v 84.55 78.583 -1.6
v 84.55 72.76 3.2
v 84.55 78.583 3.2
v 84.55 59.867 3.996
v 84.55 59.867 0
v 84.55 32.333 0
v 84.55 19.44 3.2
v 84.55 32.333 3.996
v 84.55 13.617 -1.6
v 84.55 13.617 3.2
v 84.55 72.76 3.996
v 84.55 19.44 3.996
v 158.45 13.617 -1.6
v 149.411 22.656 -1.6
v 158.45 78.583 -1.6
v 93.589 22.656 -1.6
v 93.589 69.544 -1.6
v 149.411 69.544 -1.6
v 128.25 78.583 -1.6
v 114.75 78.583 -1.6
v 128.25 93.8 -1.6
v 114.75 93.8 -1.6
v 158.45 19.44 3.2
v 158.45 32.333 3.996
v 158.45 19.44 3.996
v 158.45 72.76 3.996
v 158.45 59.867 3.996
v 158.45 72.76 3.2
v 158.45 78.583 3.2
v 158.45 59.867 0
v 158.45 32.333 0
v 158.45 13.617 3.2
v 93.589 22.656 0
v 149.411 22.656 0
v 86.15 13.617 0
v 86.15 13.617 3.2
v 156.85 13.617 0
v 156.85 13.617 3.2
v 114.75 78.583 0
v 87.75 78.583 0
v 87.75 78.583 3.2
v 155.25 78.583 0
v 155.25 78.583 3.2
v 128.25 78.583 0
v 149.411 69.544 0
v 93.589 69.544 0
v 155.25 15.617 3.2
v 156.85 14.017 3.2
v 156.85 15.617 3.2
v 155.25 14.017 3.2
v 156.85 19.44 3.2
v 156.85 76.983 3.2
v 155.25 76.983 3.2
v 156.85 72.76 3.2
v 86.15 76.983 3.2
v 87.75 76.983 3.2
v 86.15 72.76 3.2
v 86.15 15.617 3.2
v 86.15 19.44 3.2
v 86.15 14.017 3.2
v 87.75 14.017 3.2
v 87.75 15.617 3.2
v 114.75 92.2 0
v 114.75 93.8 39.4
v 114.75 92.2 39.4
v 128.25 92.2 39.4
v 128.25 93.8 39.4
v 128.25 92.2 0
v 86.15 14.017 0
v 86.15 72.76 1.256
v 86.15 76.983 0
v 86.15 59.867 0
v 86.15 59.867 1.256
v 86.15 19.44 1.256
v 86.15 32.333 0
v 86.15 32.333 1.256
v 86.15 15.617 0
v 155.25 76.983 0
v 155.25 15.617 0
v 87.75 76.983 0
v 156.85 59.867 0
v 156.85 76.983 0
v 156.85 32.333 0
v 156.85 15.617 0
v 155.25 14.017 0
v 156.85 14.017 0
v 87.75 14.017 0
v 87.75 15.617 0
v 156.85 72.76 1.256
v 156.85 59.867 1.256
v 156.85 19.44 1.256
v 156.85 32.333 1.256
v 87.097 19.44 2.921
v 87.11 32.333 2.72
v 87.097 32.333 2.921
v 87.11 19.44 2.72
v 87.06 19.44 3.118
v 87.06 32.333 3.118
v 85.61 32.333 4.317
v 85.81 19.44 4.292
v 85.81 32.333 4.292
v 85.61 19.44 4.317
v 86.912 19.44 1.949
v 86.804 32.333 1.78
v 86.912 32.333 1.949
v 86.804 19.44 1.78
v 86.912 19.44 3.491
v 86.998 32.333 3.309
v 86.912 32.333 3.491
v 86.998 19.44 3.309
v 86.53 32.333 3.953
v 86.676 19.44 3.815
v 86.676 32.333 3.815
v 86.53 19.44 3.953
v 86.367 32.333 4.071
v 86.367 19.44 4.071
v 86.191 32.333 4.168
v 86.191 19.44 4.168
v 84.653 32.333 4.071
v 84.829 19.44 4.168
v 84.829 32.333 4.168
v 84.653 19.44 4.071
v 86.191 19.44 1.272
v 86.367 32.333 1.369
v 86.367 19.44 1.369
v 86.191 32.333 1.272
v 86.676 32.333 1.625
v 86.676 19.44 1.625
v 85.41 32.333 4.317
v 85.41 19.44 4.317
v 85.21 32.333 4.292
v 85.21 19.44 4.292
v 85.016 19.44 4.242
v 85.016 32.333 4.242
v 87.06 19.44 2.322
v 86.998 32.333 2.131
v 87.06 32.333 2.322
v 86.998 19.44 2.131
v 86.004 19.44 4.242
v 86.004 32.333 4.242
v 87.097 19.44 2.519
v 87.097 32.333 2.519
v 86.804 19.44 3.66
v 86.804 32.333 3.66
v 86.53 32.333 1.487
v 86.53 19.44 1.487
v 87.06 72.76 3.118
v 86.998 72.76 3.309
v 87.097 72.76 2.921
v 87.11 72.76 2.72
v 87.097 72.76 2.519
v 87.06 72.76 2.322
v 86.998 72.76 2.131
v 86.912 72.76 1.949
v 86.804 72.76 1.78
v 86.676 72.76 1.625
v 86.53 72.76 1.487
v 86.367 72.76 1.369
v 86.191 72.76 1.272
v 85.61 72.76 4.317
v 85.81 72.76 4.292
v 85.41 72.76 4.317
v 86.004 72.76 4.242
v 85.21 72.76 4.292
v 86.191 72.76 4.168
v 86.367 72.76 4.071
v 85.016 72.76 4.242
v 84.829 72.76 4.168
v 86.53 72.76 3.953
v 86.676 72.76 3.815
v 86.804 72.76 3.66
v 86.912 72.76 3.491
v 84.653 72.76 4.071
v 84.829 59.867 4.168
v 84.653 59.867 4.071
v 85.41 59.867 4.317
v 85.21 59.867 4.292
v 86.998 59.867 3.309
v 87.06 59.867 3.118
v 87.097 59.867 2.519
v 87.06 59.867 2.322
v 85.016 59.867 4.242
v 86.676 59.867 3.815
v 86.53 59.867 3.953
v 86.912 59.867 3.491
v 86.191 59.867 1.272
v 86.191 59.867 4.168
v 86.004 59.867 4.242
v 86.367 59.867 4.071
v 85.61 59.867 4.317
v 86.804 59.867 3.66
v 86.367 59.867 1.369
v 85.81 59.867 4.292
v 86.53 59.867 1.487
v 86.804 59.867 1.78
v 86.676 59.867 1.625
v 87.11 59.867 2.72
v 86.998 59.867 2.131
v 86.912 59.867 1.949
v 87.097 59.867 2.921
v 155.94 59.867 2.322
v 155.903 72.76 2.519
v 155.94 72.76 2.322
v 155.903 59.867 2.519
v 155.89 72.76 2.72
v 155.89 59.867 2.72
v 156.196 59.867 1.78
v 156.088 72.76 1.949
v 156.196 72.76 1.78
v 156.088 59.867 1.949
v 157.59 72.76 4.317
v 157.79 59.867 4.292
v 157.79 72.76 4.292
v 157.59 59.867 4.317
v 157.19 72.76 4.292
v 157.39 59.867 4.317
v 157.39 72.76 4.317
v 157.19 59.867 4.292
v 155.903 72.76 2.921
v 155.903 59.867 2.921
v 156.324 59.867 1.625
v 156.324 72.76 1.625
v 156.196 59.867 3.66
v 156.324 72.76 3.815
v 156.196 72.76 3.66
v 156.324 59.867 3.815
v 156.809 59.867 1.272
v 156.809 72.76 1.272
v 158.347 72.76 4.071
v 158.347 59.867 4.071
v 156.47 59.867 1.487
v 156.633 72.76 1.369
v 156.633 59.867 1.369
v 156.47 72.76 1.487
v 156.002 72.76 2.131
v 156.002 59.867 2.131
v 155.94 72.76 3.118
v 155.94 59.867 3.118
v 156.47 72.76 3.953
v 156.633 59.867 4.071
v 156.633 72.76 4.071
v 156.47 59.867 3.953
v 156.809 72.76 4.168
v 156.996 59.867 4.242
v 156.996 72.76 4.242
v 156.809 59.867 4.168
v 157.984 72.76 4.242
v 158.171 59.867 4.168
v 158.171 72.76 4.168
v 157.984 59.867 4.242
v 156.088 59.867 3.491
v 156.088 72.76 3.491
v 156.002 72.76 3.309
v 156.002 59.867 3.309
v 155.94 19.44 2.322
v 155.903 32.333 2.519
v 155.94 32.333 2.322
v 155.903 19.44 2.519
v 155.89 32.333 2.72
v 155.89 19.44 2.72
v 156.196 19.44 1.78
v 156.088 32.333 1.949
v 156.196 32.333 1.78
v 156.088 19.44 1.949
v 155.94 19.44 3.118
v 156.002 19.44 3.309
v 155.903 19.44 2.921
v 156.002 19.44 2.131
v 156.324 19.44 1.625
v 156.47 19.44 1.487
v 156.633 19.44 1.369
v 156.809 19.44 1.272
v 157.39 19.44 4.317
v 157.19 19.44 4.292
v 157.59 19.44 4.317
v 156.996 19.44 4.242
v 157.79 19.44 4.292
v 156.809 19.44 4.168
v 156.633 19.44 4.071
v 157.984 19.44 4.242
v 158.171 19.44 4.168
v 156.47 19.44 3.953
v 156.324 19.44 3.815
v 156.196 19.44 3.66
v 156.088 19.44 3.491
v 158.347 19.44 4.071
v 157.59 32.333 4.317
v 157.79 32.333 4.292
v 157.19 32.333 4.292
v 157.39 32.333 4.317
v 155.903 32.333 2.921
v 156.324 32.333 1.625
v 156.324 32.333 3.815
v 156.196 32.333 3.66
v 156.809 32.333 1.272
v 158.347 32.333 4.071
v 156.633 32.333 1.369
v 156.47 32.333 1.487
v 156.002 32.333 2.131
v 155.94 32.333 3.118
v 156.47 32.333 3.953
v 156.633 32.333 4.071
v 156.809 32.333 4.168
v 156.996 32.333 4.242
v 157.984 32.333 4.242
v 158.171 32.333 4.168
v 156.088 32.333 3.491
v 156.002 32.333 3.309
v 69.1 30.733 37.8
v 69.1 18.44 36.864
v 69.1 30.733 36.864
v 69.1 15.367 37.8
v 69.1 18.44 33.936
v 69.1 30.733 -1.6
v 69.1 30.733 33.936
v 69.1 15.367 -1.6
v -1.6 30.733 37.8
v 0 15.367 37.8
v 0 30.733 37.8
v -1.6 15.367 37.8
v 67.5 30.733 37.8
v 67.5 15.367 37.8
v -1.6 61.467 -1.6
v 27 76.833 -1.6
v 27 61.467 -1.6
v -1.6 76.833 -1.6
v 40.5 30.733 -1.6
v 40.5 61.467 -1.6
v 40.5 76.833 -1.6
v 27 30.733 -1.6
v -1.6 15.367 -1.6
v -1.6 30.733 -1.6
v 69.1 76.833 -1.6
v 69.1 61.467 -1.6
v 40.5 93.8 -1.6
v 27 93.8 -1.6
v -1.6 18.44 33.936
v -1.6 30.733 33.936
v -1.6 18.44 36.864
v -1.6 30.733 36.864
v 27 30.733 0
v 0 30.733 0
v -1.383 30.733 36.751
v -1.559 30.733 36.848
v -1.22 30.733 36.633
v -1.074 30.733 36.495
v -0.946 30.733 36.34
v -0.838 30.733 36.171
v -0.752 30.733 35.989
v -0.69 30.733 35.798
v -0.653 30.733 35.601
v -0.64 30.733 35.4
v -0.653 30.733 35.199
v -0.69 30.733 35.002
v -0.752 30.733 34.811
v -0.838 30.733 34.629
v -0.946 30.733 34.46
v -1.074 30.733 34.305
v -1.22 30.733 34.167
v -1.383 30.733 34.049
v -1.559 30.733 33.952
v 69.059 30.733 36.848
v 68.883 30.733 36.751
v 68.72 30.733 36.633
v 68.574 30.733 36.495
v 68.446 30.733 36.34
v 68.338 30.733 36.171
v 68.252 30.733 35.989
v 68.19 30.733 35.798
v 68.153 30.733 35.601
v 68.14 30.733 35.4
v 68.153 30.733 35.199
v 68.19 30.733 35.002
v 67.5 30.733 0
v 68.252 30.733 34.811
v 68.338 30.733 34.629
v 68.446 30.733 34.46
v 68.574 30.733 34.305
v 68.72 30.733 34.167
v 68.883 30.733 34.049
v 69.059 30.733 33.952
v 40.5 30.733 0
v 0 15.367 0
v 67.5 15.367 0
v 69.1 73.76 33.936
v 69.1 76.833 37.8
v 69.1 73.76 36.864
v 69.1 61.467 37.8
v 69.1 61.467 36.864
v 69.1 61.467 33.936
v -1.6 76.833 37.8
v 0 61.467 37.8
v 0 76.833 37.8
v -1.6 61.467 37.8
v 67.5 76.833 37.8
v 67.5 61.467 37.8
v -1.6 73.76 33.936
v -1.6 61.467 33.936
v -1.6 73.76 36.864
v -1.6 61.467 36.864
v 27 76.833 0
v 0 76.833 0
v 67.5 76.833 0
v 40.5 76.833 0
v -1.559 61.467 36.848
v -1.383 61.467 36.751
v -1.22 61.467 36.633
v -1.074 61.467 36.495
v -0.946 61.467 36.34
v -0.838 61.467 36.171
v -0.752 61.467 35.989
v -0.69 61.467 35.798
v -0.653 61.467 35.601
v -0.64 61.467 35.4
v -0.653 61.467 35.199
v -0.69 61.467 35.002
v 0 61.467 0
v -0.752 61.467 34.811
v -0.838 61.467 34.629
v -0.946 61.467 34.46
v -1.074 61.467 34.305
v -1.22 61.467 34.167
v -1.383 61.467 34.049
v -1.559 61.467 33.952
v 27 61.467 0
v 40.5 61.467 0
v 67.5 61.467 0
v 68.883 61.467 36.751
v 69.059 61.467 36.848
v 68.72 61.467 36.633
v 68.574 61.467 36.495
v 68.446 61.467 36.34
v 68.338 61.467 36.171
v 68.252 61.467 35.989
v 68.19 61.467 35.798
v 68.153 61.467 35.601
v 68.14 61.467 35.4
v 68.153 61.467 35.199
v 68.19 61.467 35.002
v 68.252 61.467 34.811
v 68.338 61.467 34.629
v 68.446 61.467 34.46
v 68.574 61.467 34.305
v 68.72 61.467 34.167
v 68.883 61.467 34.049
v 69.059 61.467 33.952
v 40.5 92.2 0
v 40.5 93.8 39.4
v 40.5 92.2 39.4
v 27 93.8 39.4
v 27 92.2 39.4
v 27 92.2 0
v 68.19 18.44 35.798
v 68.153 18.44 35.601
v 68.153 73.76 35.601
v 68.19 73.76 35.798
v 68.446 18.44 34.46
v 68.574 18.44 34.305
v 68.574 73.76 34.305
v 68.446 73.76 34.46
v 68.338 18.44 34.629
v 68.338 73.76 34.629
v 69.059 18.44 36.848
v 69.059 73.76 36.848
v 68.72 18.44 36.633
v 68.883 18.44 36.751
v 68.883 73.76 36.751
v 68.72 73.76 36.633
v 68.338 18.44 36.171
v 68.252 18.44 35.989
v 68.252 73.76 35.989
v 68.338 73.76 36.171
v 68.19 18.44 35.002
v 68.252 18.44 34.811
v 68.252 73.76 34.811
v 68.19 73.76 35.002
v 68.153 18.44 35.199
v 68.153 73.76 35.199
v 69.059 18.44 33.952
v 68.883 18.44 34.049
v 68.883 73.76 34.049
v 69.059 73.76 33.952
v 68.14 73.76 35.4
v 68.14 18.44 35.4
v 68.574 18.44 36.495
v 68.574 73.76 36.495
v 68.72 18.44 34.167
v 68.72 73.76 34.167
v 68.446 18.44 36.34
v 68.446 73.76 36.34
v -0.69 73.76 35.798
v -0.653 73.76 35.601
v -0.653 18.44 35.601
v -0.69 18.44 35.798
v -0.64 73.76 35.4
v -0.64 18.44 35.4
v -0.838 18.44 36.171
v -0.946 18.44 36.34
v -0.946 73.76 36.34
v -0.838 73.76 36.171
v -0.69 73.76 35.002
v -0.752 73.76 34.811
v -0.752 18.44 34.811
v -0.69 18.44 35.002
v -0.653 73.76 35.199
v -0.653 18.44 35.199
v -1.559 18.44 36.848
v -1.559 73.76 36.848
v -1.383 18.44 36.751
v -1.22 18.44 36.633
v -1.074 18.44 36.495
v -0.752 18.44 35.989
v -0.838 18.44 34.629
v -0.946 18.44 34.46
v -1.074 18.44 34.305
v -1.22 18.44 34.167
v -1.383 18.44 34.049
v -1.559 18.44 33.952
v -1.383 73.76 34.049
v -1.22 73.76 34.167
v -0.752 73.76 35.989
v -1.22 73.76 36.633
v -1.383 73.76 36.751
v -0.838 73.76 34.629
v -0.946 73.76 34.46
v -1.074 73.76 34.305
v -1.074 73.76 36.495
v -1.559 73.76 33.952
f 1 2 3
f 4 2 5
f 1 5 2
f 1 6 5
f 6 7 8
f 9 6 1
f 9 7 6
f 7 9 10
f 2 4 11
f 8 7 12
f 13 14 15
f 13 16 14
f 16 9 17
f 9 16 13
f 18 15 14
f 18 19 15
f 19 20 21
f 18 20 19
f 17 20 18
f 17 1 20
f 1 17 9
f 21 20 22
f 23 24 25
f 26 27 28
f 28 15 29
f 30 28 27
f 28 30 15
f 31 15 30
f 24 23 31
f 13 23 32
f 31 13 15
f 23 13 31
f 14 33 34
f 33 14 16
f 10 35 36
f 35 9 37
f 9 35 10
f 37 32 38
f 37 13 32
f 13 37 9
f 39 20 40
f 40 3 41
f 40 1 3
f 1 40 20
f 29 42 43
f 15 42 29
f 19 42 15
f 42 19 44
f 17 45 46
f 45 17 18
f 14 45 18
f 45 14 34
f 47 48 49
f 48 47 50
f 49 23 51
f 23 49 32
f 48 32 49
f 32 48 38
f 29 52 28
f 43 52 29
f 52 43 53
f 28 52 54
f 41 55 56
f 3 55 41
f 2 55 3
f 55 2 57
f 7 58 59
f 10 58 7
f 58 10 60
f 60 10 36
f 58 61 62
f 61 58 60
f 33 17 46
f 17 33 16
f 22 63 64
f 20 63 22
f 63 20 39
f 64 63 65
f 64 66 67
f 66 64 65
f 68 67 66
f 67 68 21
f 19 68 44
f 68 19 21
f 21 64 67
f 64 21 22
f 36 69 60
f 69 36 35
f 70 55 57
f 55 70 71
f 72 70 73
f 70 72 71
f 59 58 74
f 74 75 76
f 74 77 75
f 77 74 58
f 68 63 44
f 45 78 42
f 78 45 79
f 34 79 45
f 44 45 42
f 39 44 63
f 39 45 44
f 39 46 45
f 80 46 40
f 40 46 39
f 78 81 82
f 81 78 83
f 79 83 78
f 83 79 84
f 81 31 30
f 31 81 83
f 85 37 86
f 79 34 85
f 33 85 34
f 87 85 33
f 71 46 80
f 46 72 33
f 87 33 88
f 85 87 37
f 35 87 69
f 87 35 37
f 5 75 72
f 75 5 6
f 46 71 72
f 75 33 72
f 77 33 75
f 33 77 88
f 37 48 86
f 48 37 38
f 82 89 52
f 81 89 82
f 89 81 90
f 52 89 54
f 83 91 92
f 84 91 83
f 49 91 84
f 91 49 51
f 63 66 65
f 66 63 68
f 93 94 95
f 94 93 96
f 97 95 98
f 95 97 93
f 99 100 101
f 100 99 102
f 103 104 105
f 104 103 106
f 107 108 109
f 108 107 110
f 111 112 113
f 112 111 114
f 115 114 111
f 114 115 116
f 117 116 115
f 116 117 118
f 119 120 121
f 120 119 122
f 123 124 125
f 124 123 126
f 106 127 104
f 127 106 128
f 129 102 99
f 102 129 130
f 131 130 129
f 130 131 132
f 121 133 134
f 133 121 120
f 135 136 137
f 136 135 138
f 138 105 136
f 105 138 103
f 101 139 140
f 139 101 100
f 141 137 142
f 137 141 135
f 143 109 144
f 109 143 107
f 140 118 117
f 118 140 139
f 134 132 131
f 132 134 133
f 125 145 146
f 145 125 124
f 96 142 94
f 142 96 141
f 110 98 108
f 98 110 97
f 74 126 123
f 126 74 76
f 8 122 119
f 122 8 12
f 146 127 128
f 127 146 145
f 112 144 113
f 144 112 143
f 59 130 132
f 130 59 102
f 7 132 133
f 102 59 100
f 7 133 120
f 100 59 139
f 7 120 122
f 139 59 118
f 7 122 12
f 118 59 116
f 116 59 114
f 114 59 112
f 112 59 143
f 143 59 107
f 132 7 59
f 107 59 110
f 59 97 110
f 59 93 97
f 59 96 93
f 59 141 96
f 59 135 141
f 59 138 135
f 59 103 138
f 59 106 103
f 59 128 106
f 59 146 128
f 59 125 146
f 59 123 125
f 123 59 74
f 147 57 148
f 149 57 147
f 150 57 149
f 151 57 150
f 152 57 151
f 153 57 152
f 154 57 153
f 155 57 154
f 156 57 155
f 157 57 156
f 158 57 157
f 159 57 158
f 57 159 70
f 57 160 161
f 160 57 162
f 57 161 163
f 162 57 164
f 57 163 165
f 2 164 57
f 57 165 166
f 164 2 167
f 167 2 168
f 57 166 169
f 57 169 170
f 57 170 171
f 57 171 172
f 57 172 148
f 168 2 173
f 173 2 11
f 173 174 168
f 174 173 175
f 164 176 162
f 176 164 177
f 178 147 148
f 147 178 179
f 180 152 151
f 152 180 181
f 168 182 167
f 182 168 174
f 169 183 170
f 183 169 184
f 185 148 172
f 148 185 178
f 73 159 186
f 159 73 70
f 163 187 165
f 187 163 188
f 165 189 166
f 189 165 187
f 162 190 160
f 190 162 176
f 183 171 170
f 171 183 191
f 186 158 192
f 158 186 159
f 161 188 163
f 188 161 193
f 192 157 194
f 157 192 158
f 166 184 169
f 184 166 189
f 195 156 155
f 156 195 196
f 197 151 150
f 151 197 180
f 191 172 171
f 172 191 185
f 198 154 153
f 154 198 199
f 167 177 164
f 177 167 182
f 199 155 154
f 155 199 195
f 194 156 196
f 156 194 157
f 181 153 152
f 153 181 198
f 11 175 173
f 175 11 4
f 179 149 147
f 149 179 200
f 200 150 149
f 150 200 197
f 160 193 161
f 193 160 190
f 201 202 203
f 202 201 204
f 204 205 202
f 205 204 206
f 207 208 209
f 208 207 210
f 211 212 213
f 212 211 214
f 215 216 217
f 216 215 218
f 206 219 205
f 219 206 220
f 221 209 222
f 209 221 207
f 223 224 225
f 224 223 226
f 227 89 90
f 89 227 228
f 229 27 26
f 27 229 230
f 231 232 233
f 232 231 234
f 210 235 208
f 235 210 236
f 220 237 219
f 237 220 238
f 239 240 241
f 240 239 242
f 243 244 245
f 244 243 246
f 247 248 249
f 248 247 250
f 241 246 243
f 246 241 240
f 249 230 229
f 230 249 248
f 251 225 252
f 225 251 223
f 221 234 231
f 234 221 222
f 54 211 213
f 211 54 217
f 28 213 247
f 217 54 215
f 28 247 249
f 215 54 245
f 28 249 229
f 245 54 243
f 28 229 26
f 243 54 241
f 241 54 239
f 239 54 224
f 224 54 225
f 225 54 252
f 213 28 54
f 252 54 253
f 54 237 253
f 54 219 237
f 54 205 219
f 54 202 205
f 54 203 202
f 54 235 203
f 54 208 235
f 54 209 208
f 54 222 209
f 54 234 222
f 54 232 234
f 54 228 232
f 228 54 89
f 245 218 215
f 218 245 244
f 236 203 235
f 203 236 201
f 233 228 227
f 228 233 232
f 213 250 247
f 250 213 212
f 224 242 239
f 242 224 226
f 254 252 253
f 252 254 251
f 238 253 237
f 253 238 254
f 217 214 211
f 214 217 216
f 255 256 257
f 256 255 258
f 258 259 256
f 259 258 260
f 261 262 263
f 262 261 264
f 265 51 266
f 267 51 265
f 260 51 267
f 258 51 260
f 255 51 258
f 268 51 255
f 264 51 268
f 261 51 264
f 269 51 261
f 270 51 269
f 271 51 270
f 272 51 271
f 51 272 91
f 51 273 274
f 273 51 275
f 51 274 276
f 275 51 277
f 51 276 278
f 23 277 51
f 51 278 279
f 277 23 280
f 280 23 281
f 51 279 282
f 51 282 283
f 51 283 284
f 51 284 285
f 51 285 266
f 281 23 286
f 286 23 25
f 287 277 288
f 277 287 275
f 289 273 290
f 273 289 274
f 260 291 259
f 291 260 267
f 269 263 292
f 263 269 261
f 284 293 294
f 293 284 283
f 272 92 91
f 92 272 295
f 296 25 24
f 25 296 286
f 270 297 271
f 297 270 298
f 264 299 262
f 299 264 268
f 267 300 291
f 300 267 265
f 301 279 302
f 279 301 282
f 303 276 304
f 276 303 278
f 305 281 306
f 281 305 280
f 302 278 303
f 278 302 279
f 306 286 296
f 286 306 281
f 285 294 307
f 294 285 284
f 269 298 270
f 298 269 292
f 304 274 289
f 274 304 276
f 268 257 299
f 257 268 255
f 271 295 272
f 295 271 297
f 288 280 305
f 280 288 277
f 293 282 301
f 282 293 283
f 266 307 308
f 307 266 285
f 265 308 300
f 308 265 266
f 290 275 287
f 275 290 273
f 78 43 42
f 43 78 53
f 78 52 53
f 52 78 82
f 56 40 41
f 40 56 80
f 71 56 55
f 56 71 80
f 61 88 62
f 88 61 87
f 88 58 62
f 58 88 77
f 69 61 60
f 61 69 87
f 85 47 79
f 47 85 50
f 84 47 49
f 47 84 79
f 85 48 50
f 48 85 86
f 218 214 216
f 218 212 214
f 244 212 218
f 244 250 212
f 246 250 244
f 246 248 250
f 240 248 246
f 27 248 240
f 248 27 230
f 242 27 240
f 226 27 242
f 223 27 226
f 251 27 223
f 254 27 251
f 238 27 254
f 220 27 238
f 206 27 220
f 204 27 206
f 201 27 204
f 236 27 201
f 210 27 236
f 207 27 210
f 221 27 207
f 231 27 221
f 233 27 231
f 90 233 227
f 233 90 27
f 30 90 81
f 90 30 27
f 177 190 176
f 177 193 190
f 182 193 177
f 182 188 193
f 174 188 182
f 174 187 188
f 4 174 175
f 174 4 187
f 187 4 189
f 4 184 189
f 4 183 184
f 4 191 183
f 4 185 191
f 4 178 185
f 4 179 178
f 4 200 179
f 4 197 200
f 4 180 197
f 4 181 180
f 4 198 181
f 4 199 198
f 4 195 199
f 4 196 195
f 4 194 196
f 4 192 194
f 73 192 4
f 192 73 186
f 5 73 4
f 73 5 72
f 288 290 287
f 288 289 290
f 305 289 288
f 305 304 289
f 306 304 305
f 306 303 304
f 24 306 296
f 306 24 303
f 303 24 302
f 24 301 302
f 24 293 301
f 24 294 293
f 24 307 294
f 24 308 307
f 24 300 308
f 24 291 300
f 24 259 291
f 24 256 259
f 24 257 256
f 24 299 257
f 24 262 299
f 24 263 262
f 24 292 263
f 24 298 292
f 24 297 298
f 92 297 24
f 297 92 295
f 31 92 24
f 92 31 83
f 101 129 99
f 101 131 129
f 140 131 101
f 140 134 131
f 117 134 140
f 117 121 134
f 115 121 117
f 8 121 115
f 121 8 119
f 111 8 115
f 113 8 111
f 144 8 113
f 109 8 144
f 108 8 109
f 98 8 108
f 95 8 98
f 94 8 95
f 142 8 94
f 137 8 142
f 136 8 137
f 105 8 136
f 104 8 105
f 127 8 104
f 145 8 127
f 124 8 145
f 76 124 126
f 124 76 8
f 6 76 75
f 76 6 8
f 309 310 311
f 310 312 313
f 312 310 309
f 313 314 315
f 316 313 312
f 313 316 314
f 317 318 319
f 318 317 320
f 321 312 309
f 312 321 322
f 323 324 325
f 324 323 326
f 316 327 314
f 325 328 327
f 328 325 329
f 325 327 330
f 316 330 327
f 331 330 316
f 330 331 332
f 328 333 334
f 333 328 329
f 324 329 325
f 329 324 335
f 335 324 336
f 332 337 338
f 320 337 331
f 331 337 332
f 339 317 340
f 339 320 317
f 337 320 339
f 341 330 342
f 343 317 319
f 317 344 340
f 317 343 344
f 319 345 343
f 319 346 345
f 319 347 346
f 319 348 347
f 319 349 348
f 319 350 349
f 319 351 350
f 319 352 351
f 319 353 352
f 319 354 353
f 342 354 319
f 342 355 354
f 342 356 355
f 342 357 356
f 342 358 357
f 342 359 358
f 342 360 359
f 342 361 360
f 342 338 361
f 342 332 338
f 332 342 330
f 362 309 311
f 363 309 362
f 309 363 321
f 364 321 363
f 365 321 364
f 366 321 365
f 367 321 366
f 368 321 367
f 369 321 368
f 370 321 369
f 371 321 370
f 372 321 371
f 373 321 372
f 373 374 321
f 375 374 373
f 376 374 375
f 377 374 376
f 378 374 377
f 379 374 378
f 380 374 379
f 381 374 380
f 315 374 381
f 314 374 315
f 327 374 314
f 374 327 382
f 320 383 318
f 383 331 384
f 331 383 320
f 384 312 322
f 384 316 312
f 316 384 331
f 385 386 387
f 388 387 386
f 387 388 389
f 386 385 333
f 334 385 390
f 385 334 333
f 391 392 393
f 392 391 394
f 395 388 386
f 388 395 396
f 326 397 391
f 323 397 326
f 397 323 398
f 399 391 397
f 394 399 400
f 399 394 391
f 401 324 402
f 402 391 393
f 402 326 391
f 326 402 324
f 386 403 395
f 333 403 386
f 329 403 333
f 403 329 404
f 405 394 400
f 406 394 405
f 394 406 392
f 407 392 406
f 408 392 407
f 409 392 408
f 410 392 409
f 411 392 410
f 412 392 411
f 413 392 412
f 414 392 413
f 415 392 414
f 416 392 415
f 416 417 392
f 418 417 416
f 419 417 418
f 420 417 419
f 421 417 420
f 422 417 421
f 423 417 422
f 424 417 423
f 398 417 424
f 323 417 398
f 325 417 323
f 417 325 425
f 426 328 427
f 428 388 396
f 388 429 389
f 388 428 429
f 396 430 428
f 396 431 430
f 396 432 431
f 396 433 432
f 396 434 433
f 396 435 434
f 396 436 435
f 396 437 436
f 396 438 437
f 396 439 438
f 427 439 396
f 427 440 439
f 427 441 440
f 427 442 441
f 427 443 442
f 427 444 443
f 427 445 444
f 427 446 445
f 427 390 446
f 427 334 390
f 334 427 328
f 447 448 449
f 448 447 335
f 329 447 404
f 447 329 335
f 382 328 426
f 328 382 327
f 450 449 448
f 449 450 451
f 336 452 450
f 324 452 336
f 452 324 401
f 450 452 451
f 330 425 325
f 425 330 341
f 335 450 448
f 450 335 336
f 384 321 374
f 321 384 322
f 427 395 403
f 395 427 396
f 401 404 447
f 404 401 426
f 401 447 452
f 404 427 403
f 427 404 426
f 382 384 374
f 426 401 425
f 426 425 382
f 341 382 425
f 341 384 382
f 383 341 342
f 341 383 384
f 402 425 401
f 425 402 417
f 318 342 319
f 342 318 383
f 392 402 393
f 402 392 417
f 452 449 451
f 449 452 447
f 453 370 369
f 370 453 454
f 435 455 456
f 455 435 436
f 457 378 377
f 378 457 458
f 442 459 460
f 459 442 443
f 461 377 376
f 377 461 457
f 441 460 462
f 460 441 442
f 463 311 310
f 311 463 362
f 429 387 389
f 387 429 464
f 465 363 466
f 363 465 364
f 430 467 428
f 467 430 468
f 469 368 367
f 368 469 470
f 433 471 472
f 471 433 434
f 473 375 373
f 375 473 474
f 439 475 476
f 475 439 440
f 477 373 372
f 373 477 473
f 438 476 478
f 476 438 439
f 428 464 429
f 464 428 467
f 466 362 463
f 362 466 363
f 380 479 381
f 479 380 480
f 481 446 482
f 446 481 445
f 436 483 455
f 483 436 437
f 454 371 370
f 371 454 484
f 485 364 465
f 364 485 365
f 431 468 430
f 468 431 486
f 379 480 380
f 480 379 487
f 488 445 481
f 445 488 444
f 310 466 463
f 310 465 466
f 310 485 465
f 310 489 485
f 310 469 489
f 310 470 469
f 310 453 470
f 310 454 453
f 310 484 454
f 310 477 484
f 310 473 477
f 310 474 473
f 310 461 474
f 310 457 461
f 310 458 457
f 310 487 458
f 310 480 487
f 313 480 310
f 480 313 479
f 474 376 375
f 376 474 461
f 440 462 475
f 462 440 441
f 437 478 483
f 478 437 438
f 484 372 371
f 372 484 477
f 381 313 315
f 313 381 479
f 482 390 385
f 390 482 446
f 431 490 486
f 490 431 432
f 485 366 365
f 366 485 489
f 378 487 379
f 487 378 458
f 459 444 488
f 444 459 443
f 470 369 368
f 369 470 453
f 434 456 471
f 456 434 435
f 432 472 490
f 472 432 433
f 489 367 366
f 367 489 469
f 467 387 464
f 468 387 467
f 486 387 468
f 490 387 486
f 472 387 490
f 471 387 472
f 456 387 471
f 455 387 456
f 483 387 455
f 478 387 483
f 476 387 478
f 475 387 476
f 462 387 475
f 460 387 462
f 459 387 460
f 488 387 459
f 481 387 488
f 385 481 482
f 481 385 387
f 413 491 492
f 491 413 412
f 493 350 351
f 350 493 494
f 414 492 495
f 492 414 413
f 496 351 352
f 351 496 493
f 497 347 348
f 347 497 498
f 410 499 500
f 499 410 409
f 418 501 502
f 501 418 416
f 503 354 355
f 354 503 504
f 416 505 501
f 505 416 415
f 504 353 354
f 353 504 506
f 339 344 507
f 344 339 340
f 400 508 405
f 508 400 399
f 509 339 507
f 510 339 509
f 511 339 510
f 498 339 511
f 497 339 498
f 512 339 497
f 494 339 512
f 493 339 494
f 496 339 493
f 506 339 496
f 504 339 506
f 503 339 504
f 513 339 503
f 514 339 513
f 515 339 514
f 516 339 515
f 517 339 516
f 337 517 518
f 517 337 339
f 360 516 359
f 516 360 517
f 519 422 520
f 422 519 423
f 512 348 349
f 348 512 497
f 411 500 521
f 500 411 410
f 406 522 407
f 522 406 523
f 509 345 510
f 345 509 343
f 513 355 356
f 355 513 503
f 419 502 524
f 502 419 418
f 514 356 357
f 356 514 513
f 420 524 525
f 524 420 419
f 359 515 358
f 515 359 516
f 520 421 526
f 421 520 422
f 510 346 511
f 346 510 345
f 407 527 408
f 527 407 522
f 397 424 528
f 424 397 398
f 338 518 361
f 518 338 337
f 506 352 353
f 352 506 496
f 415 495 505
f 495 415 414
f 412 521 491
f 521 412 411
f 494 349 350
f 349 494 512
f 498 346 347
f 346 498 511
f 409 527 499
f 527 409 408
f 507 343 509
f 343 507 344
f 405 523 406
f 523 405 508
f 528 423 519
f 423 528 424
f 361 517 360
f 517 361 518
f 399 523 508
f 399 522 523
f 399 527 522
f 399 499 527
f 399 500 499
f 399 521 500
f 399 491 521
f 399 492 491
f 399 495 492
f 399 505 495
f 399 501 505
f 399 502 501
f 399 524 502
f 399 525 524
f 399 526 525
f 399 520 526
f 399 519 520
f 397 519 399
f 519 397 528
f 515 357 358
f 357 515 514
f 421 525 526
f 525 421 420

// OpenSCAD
// SDE big cards sleeved : 66*90.7 tol 1.5

// Width of a card
card_width = 66;
// Length of a card
card_length = 90.7;
// Total height of the stack of cards you need a box for
stack_height = 36.3;
// The size of the support that will go beneath the card box
support_size = 28;
// This value will be added to the width, length and height. It should probably never be 0 if your values are precise.
tolerance = 1.5;
// The thickness of the printed parts, 1.6 is good for a 0.4 nozzle with a shell thikness of 0.8
thickness = 1.6;
// Which parts do you want to print ?
wut2print = "boxncover"; // [box:Bottom part,lid:Lid,boxncover:Bottom and lid,support:Support,every:Everything]


print_part();

cardwidth = card_width;
cardlength = card_length;
cardheight = stack_height;
support = support_size;

tol = tolerance;
thick1 = thickness;

cardw1 = cardwidth+tol;
cardl1 = cardlength+tol;
cardh1 = cardheight+tol;
cardldiv1 = cardl1/6;
cardwdiv1 = cardw1/5;

module print_part(){

if (wut2print == "box") {
bottom(cardw1, cardl1, cardh1, thick1, cardldiv1, cardwdiv1);
}
else if (wut2print == "lid") {
    translate([cardw1*2.3,0,cardh1]) rotate([0,180,0]) top(cardw1, cardl1, cardh1, thick1, cardldiv1, cardwdiv1);
}
else if (wut2print == "boxncover") {
    translate([cardw1*2.3,0,cardh1]) rotate([0,180,0]) top(cardw1, cardl1, cardh1, thick1, cardldiv1, cardwdiv1);
    bottom(cardw1, cardl1, cardh1, thick1, cardldiv1, cardwdiv1);
}
else if (wut2print == "support") {
support(cardw1, cardl1, cardh1, thick1, cardldiv1, cardwdiv1, support);
}
else if (wut2print == "every") {
    bottom(cardw1, cardl1, cardh1, thick1, cardldiv1, cardwdiv1);
    translate([cardw1*2.3,0,cardh1]) rotate([0,180,0]) top(cardw1, cardl1, cardh1, thick1, cardldiv1, cardwdiv1);
    translate([0,-cardldiv1*5,support]) support(cardw1, cardl1, cardh1, thick1, cardldiv1, cardwdiv1, support);
}

}


module bottom(cardw, cardl, cardh, thick, cardldiv, cardwdiv)
{
    difference(){
    union(){
        translate([-thick,cardldiv,-thick]) cube([cardw+thick*2,cardldiv,cardh+thick]);
        translate([-thick,cardldiv*4,-thick]) cube([cardw+thick*2,cardldiv,cardh+thick]);
        translate([cardwdiv*2,cardldiv,-thick]) cube([cardwdiv,cardl-cardldiv+thick,cardh+thick*2]);
    }
    translate([0,-5,0]) cube([cardw,cardl+5,cardh+5]);
    translate([cardw+thick*1.4,cardldiv*5-cardldiv/5,cardh-thick*1.5]) rotate([90,0,0]) cylinder($fn = 50, r = thick, h = cardldiv*4-2*(cardldiv/5));
    translate([-thick*1.4,cardldiv*5-cardldiv/5,cardh-thick*1.5]) rotate([90,0,0]) cylinder($fn = 50, r = thick, h = cardldiv*4-2*(cardldiv/5));
    }
}

module top(cardw, cardl, cardh, thick, cardldiv, cardwdiv)
{
difference(){
union(){
    difference(){
        union(){
            translate([-thick*2,cardldiv1-thick-tol/10,cardh-thick]) cube([cardw+thick*4,cardldiv1/1.7,thick*2]);
            translate([-thick*2,cardldiv1*5-cardldiv1/1.7+thick+tol/10,cardh-thick]) cube([cardw+thick*4,cardldiv1/1.7,thick*2]);
            translate([-thick*2,cardldiv1-thick-tol/10,cardh-thick*2]) cube([cardldiv1/1.7,cardldiv1*4+thick*2+tol/5,thick*3]);
            translate([cardw+thick*2-cardldiv1/1.7,cardldiv1-thick-tol/10,cardh-thick*2]) cube([cardldiv1/1.7,cardldiv1*4+thick*2+tol/5,thick*3]);
            translate([cardwdiv*2,cardldiv1*5-cardldiv1/1.7+thick+tol/10,-thick]) cube([cardwdiv,cardl1-(cardldiv1*5-cardldiv1/1.7+thick+tol/10)+thick,cardh+thick*2]);
        }
        translate([-thick,0,-thick*2]) cube([cardw+thick*2,cardl,cardh+thick*2]);
        //#translate([cardldiv1/1.7-thick*2,cardldiv1+cardldiv1/1.7-thick-tol/10,thick*2]) cube([cardw1+thick*4-cardldiv1/1.7*2,cardldiv1*4-cardldiv1/1.7-thick+tol/2,cardh+thick*2]);
    }
    translate([cardw+thick*1.4,cardldiv*2+cardldiv/5+1,cardh-thick*1.7]) rotate([90,0,0]) cylinder($fn = 50, r = thick, h = cardldiv);
    translate([cardw+thick*1.4,cardldiv*5-cardldiv/5-1,cardh-thick*1.7]) rotate([90,0,0]) cylinder($fn = 50, r = thick, h = cardldiv);
    translate([-thick*1.4,cardldiv*5-cardldiv/5-1,cardh-thick*1.7]) rotate([90,0,0]) cylinder($fn = 50, r = thick, h = cardldiv);
    translate([-thick*1.4,cardldiv*2+cardldiv/5+1,cardh-thick*1.7]) rotate([90,0,0]) cylinder($fn = 50, r = thick, h = cardldiv);

translate([-thick*2,cardldiv*5+tol/10,cardh-thick*2]) cube([thick*2,thick,thick*3]);
    translate([cardw,cardldiv*5+tol/10,cardh-thick*2]) cube([thick*2,thick,thick*3]);
    translate([cardw,cardldiv-tol+tol/10,cardh-thick*2]) cube([thick*2,thick,thick*3]);
    translate([-thick*2,cardldiv-tol+tol/10,cardh-thick*2]) cube([thick*2,thick,thick*3]);
}
translate([cardw+thick*2,0,0]) cube([10,cardl,cardh*1.1]);
translate([-thick*3,cardldiv*2+thick,0]) cube([cardw*1.2,cardldiv*2-thick*2,cardh]);

translate([-10-thick*2,0,0]) cube([10,cardl,cardh*1.1]);
}
}

module support(cardw, cardl, cardh, thick, cardldiv, cardwdiv, sup)
{
    difference(){
        union(){
            translate([0,cardldiv-2,-sup-thick]) cube([cardwdiv/2, cardldiv+4, sup+thick-0.1]);
            translate([cardwdiv*4.5,cardldiv-2,-sup-thick]) cube([cardwdiv/2, cardldiv+4, sup+thick-0.1]);
            translate([cardwdiv*4.5,cardldiv*4-2,-sup-thick]) cube([cardwdiv/2, cardldiv+4, sup+thick-0.1]);
            translate([0,cardldiv*4-2,-sup-thick]) cube([cardwdiv/2, cardldiv+4, sup+thick-0.1]);
            hull(){
            translate([0,cardldiv*4-2,-sup-thick]) cube([cardwdiv/2, cardldiv+4, 1]);
            translate([cardwdiv*4.5,cardldiv-2,-sup-thick]) cube([cardwdiv/2, cardldiv+4, 1]);}
            hull(){
                translate([0,cardldiv-2,-sup-thick]) cube([cardwdiv/2, cardldiv+4, 1]);
                translate([cardwdiv*4.5,cardldiv*4-2,-sup-thick]) cube([cardwdiv/2, cardldiv+4, 1]);}
            translate([cardwdiv*2-2,cardldiv*2.65,-sup-thick]) cube([cardwdiv+4, cardldiv/1.5, sup+thick-0.1]);
        }
        
    difference(){
    union(){
        translate([-thick,cardldiv-0.7,-thick]) cube([cardw+thick*2,cardldiv+1.4,cardh+thick]);
        translate([-thick,cardldiv*4-0.7,-thick]) cube([cardw+thick*2,cardldiv+1.4,cardh+thick]);
        translate([cardwdiv*2-0.7,cardldiv,-thick]) cube([cardwdiv+1.4,cardl-cardldiv+thick,cardh+thick*2]);
    }
    translate([0,-5,0]) cube([cardw,cardl+5,cardh+5]);
    translate([cardw+thick*1.4,cardldiv*5-cardldiv/5,cardh-thick*1.5]) rotate([90,0,0]) cylinder($fn = 50, r = thick, h = cardldiv*4-2*(cardldiv/5));
    translate([-thick*1.4,cardldiv*5-cardldiv/5,cardh-thick*1.5]) rotate([90,0,0]) cylinder($fn = 50, r = thick, h = cardldiv*4-2*(cardldiv/5));
    }
}}
